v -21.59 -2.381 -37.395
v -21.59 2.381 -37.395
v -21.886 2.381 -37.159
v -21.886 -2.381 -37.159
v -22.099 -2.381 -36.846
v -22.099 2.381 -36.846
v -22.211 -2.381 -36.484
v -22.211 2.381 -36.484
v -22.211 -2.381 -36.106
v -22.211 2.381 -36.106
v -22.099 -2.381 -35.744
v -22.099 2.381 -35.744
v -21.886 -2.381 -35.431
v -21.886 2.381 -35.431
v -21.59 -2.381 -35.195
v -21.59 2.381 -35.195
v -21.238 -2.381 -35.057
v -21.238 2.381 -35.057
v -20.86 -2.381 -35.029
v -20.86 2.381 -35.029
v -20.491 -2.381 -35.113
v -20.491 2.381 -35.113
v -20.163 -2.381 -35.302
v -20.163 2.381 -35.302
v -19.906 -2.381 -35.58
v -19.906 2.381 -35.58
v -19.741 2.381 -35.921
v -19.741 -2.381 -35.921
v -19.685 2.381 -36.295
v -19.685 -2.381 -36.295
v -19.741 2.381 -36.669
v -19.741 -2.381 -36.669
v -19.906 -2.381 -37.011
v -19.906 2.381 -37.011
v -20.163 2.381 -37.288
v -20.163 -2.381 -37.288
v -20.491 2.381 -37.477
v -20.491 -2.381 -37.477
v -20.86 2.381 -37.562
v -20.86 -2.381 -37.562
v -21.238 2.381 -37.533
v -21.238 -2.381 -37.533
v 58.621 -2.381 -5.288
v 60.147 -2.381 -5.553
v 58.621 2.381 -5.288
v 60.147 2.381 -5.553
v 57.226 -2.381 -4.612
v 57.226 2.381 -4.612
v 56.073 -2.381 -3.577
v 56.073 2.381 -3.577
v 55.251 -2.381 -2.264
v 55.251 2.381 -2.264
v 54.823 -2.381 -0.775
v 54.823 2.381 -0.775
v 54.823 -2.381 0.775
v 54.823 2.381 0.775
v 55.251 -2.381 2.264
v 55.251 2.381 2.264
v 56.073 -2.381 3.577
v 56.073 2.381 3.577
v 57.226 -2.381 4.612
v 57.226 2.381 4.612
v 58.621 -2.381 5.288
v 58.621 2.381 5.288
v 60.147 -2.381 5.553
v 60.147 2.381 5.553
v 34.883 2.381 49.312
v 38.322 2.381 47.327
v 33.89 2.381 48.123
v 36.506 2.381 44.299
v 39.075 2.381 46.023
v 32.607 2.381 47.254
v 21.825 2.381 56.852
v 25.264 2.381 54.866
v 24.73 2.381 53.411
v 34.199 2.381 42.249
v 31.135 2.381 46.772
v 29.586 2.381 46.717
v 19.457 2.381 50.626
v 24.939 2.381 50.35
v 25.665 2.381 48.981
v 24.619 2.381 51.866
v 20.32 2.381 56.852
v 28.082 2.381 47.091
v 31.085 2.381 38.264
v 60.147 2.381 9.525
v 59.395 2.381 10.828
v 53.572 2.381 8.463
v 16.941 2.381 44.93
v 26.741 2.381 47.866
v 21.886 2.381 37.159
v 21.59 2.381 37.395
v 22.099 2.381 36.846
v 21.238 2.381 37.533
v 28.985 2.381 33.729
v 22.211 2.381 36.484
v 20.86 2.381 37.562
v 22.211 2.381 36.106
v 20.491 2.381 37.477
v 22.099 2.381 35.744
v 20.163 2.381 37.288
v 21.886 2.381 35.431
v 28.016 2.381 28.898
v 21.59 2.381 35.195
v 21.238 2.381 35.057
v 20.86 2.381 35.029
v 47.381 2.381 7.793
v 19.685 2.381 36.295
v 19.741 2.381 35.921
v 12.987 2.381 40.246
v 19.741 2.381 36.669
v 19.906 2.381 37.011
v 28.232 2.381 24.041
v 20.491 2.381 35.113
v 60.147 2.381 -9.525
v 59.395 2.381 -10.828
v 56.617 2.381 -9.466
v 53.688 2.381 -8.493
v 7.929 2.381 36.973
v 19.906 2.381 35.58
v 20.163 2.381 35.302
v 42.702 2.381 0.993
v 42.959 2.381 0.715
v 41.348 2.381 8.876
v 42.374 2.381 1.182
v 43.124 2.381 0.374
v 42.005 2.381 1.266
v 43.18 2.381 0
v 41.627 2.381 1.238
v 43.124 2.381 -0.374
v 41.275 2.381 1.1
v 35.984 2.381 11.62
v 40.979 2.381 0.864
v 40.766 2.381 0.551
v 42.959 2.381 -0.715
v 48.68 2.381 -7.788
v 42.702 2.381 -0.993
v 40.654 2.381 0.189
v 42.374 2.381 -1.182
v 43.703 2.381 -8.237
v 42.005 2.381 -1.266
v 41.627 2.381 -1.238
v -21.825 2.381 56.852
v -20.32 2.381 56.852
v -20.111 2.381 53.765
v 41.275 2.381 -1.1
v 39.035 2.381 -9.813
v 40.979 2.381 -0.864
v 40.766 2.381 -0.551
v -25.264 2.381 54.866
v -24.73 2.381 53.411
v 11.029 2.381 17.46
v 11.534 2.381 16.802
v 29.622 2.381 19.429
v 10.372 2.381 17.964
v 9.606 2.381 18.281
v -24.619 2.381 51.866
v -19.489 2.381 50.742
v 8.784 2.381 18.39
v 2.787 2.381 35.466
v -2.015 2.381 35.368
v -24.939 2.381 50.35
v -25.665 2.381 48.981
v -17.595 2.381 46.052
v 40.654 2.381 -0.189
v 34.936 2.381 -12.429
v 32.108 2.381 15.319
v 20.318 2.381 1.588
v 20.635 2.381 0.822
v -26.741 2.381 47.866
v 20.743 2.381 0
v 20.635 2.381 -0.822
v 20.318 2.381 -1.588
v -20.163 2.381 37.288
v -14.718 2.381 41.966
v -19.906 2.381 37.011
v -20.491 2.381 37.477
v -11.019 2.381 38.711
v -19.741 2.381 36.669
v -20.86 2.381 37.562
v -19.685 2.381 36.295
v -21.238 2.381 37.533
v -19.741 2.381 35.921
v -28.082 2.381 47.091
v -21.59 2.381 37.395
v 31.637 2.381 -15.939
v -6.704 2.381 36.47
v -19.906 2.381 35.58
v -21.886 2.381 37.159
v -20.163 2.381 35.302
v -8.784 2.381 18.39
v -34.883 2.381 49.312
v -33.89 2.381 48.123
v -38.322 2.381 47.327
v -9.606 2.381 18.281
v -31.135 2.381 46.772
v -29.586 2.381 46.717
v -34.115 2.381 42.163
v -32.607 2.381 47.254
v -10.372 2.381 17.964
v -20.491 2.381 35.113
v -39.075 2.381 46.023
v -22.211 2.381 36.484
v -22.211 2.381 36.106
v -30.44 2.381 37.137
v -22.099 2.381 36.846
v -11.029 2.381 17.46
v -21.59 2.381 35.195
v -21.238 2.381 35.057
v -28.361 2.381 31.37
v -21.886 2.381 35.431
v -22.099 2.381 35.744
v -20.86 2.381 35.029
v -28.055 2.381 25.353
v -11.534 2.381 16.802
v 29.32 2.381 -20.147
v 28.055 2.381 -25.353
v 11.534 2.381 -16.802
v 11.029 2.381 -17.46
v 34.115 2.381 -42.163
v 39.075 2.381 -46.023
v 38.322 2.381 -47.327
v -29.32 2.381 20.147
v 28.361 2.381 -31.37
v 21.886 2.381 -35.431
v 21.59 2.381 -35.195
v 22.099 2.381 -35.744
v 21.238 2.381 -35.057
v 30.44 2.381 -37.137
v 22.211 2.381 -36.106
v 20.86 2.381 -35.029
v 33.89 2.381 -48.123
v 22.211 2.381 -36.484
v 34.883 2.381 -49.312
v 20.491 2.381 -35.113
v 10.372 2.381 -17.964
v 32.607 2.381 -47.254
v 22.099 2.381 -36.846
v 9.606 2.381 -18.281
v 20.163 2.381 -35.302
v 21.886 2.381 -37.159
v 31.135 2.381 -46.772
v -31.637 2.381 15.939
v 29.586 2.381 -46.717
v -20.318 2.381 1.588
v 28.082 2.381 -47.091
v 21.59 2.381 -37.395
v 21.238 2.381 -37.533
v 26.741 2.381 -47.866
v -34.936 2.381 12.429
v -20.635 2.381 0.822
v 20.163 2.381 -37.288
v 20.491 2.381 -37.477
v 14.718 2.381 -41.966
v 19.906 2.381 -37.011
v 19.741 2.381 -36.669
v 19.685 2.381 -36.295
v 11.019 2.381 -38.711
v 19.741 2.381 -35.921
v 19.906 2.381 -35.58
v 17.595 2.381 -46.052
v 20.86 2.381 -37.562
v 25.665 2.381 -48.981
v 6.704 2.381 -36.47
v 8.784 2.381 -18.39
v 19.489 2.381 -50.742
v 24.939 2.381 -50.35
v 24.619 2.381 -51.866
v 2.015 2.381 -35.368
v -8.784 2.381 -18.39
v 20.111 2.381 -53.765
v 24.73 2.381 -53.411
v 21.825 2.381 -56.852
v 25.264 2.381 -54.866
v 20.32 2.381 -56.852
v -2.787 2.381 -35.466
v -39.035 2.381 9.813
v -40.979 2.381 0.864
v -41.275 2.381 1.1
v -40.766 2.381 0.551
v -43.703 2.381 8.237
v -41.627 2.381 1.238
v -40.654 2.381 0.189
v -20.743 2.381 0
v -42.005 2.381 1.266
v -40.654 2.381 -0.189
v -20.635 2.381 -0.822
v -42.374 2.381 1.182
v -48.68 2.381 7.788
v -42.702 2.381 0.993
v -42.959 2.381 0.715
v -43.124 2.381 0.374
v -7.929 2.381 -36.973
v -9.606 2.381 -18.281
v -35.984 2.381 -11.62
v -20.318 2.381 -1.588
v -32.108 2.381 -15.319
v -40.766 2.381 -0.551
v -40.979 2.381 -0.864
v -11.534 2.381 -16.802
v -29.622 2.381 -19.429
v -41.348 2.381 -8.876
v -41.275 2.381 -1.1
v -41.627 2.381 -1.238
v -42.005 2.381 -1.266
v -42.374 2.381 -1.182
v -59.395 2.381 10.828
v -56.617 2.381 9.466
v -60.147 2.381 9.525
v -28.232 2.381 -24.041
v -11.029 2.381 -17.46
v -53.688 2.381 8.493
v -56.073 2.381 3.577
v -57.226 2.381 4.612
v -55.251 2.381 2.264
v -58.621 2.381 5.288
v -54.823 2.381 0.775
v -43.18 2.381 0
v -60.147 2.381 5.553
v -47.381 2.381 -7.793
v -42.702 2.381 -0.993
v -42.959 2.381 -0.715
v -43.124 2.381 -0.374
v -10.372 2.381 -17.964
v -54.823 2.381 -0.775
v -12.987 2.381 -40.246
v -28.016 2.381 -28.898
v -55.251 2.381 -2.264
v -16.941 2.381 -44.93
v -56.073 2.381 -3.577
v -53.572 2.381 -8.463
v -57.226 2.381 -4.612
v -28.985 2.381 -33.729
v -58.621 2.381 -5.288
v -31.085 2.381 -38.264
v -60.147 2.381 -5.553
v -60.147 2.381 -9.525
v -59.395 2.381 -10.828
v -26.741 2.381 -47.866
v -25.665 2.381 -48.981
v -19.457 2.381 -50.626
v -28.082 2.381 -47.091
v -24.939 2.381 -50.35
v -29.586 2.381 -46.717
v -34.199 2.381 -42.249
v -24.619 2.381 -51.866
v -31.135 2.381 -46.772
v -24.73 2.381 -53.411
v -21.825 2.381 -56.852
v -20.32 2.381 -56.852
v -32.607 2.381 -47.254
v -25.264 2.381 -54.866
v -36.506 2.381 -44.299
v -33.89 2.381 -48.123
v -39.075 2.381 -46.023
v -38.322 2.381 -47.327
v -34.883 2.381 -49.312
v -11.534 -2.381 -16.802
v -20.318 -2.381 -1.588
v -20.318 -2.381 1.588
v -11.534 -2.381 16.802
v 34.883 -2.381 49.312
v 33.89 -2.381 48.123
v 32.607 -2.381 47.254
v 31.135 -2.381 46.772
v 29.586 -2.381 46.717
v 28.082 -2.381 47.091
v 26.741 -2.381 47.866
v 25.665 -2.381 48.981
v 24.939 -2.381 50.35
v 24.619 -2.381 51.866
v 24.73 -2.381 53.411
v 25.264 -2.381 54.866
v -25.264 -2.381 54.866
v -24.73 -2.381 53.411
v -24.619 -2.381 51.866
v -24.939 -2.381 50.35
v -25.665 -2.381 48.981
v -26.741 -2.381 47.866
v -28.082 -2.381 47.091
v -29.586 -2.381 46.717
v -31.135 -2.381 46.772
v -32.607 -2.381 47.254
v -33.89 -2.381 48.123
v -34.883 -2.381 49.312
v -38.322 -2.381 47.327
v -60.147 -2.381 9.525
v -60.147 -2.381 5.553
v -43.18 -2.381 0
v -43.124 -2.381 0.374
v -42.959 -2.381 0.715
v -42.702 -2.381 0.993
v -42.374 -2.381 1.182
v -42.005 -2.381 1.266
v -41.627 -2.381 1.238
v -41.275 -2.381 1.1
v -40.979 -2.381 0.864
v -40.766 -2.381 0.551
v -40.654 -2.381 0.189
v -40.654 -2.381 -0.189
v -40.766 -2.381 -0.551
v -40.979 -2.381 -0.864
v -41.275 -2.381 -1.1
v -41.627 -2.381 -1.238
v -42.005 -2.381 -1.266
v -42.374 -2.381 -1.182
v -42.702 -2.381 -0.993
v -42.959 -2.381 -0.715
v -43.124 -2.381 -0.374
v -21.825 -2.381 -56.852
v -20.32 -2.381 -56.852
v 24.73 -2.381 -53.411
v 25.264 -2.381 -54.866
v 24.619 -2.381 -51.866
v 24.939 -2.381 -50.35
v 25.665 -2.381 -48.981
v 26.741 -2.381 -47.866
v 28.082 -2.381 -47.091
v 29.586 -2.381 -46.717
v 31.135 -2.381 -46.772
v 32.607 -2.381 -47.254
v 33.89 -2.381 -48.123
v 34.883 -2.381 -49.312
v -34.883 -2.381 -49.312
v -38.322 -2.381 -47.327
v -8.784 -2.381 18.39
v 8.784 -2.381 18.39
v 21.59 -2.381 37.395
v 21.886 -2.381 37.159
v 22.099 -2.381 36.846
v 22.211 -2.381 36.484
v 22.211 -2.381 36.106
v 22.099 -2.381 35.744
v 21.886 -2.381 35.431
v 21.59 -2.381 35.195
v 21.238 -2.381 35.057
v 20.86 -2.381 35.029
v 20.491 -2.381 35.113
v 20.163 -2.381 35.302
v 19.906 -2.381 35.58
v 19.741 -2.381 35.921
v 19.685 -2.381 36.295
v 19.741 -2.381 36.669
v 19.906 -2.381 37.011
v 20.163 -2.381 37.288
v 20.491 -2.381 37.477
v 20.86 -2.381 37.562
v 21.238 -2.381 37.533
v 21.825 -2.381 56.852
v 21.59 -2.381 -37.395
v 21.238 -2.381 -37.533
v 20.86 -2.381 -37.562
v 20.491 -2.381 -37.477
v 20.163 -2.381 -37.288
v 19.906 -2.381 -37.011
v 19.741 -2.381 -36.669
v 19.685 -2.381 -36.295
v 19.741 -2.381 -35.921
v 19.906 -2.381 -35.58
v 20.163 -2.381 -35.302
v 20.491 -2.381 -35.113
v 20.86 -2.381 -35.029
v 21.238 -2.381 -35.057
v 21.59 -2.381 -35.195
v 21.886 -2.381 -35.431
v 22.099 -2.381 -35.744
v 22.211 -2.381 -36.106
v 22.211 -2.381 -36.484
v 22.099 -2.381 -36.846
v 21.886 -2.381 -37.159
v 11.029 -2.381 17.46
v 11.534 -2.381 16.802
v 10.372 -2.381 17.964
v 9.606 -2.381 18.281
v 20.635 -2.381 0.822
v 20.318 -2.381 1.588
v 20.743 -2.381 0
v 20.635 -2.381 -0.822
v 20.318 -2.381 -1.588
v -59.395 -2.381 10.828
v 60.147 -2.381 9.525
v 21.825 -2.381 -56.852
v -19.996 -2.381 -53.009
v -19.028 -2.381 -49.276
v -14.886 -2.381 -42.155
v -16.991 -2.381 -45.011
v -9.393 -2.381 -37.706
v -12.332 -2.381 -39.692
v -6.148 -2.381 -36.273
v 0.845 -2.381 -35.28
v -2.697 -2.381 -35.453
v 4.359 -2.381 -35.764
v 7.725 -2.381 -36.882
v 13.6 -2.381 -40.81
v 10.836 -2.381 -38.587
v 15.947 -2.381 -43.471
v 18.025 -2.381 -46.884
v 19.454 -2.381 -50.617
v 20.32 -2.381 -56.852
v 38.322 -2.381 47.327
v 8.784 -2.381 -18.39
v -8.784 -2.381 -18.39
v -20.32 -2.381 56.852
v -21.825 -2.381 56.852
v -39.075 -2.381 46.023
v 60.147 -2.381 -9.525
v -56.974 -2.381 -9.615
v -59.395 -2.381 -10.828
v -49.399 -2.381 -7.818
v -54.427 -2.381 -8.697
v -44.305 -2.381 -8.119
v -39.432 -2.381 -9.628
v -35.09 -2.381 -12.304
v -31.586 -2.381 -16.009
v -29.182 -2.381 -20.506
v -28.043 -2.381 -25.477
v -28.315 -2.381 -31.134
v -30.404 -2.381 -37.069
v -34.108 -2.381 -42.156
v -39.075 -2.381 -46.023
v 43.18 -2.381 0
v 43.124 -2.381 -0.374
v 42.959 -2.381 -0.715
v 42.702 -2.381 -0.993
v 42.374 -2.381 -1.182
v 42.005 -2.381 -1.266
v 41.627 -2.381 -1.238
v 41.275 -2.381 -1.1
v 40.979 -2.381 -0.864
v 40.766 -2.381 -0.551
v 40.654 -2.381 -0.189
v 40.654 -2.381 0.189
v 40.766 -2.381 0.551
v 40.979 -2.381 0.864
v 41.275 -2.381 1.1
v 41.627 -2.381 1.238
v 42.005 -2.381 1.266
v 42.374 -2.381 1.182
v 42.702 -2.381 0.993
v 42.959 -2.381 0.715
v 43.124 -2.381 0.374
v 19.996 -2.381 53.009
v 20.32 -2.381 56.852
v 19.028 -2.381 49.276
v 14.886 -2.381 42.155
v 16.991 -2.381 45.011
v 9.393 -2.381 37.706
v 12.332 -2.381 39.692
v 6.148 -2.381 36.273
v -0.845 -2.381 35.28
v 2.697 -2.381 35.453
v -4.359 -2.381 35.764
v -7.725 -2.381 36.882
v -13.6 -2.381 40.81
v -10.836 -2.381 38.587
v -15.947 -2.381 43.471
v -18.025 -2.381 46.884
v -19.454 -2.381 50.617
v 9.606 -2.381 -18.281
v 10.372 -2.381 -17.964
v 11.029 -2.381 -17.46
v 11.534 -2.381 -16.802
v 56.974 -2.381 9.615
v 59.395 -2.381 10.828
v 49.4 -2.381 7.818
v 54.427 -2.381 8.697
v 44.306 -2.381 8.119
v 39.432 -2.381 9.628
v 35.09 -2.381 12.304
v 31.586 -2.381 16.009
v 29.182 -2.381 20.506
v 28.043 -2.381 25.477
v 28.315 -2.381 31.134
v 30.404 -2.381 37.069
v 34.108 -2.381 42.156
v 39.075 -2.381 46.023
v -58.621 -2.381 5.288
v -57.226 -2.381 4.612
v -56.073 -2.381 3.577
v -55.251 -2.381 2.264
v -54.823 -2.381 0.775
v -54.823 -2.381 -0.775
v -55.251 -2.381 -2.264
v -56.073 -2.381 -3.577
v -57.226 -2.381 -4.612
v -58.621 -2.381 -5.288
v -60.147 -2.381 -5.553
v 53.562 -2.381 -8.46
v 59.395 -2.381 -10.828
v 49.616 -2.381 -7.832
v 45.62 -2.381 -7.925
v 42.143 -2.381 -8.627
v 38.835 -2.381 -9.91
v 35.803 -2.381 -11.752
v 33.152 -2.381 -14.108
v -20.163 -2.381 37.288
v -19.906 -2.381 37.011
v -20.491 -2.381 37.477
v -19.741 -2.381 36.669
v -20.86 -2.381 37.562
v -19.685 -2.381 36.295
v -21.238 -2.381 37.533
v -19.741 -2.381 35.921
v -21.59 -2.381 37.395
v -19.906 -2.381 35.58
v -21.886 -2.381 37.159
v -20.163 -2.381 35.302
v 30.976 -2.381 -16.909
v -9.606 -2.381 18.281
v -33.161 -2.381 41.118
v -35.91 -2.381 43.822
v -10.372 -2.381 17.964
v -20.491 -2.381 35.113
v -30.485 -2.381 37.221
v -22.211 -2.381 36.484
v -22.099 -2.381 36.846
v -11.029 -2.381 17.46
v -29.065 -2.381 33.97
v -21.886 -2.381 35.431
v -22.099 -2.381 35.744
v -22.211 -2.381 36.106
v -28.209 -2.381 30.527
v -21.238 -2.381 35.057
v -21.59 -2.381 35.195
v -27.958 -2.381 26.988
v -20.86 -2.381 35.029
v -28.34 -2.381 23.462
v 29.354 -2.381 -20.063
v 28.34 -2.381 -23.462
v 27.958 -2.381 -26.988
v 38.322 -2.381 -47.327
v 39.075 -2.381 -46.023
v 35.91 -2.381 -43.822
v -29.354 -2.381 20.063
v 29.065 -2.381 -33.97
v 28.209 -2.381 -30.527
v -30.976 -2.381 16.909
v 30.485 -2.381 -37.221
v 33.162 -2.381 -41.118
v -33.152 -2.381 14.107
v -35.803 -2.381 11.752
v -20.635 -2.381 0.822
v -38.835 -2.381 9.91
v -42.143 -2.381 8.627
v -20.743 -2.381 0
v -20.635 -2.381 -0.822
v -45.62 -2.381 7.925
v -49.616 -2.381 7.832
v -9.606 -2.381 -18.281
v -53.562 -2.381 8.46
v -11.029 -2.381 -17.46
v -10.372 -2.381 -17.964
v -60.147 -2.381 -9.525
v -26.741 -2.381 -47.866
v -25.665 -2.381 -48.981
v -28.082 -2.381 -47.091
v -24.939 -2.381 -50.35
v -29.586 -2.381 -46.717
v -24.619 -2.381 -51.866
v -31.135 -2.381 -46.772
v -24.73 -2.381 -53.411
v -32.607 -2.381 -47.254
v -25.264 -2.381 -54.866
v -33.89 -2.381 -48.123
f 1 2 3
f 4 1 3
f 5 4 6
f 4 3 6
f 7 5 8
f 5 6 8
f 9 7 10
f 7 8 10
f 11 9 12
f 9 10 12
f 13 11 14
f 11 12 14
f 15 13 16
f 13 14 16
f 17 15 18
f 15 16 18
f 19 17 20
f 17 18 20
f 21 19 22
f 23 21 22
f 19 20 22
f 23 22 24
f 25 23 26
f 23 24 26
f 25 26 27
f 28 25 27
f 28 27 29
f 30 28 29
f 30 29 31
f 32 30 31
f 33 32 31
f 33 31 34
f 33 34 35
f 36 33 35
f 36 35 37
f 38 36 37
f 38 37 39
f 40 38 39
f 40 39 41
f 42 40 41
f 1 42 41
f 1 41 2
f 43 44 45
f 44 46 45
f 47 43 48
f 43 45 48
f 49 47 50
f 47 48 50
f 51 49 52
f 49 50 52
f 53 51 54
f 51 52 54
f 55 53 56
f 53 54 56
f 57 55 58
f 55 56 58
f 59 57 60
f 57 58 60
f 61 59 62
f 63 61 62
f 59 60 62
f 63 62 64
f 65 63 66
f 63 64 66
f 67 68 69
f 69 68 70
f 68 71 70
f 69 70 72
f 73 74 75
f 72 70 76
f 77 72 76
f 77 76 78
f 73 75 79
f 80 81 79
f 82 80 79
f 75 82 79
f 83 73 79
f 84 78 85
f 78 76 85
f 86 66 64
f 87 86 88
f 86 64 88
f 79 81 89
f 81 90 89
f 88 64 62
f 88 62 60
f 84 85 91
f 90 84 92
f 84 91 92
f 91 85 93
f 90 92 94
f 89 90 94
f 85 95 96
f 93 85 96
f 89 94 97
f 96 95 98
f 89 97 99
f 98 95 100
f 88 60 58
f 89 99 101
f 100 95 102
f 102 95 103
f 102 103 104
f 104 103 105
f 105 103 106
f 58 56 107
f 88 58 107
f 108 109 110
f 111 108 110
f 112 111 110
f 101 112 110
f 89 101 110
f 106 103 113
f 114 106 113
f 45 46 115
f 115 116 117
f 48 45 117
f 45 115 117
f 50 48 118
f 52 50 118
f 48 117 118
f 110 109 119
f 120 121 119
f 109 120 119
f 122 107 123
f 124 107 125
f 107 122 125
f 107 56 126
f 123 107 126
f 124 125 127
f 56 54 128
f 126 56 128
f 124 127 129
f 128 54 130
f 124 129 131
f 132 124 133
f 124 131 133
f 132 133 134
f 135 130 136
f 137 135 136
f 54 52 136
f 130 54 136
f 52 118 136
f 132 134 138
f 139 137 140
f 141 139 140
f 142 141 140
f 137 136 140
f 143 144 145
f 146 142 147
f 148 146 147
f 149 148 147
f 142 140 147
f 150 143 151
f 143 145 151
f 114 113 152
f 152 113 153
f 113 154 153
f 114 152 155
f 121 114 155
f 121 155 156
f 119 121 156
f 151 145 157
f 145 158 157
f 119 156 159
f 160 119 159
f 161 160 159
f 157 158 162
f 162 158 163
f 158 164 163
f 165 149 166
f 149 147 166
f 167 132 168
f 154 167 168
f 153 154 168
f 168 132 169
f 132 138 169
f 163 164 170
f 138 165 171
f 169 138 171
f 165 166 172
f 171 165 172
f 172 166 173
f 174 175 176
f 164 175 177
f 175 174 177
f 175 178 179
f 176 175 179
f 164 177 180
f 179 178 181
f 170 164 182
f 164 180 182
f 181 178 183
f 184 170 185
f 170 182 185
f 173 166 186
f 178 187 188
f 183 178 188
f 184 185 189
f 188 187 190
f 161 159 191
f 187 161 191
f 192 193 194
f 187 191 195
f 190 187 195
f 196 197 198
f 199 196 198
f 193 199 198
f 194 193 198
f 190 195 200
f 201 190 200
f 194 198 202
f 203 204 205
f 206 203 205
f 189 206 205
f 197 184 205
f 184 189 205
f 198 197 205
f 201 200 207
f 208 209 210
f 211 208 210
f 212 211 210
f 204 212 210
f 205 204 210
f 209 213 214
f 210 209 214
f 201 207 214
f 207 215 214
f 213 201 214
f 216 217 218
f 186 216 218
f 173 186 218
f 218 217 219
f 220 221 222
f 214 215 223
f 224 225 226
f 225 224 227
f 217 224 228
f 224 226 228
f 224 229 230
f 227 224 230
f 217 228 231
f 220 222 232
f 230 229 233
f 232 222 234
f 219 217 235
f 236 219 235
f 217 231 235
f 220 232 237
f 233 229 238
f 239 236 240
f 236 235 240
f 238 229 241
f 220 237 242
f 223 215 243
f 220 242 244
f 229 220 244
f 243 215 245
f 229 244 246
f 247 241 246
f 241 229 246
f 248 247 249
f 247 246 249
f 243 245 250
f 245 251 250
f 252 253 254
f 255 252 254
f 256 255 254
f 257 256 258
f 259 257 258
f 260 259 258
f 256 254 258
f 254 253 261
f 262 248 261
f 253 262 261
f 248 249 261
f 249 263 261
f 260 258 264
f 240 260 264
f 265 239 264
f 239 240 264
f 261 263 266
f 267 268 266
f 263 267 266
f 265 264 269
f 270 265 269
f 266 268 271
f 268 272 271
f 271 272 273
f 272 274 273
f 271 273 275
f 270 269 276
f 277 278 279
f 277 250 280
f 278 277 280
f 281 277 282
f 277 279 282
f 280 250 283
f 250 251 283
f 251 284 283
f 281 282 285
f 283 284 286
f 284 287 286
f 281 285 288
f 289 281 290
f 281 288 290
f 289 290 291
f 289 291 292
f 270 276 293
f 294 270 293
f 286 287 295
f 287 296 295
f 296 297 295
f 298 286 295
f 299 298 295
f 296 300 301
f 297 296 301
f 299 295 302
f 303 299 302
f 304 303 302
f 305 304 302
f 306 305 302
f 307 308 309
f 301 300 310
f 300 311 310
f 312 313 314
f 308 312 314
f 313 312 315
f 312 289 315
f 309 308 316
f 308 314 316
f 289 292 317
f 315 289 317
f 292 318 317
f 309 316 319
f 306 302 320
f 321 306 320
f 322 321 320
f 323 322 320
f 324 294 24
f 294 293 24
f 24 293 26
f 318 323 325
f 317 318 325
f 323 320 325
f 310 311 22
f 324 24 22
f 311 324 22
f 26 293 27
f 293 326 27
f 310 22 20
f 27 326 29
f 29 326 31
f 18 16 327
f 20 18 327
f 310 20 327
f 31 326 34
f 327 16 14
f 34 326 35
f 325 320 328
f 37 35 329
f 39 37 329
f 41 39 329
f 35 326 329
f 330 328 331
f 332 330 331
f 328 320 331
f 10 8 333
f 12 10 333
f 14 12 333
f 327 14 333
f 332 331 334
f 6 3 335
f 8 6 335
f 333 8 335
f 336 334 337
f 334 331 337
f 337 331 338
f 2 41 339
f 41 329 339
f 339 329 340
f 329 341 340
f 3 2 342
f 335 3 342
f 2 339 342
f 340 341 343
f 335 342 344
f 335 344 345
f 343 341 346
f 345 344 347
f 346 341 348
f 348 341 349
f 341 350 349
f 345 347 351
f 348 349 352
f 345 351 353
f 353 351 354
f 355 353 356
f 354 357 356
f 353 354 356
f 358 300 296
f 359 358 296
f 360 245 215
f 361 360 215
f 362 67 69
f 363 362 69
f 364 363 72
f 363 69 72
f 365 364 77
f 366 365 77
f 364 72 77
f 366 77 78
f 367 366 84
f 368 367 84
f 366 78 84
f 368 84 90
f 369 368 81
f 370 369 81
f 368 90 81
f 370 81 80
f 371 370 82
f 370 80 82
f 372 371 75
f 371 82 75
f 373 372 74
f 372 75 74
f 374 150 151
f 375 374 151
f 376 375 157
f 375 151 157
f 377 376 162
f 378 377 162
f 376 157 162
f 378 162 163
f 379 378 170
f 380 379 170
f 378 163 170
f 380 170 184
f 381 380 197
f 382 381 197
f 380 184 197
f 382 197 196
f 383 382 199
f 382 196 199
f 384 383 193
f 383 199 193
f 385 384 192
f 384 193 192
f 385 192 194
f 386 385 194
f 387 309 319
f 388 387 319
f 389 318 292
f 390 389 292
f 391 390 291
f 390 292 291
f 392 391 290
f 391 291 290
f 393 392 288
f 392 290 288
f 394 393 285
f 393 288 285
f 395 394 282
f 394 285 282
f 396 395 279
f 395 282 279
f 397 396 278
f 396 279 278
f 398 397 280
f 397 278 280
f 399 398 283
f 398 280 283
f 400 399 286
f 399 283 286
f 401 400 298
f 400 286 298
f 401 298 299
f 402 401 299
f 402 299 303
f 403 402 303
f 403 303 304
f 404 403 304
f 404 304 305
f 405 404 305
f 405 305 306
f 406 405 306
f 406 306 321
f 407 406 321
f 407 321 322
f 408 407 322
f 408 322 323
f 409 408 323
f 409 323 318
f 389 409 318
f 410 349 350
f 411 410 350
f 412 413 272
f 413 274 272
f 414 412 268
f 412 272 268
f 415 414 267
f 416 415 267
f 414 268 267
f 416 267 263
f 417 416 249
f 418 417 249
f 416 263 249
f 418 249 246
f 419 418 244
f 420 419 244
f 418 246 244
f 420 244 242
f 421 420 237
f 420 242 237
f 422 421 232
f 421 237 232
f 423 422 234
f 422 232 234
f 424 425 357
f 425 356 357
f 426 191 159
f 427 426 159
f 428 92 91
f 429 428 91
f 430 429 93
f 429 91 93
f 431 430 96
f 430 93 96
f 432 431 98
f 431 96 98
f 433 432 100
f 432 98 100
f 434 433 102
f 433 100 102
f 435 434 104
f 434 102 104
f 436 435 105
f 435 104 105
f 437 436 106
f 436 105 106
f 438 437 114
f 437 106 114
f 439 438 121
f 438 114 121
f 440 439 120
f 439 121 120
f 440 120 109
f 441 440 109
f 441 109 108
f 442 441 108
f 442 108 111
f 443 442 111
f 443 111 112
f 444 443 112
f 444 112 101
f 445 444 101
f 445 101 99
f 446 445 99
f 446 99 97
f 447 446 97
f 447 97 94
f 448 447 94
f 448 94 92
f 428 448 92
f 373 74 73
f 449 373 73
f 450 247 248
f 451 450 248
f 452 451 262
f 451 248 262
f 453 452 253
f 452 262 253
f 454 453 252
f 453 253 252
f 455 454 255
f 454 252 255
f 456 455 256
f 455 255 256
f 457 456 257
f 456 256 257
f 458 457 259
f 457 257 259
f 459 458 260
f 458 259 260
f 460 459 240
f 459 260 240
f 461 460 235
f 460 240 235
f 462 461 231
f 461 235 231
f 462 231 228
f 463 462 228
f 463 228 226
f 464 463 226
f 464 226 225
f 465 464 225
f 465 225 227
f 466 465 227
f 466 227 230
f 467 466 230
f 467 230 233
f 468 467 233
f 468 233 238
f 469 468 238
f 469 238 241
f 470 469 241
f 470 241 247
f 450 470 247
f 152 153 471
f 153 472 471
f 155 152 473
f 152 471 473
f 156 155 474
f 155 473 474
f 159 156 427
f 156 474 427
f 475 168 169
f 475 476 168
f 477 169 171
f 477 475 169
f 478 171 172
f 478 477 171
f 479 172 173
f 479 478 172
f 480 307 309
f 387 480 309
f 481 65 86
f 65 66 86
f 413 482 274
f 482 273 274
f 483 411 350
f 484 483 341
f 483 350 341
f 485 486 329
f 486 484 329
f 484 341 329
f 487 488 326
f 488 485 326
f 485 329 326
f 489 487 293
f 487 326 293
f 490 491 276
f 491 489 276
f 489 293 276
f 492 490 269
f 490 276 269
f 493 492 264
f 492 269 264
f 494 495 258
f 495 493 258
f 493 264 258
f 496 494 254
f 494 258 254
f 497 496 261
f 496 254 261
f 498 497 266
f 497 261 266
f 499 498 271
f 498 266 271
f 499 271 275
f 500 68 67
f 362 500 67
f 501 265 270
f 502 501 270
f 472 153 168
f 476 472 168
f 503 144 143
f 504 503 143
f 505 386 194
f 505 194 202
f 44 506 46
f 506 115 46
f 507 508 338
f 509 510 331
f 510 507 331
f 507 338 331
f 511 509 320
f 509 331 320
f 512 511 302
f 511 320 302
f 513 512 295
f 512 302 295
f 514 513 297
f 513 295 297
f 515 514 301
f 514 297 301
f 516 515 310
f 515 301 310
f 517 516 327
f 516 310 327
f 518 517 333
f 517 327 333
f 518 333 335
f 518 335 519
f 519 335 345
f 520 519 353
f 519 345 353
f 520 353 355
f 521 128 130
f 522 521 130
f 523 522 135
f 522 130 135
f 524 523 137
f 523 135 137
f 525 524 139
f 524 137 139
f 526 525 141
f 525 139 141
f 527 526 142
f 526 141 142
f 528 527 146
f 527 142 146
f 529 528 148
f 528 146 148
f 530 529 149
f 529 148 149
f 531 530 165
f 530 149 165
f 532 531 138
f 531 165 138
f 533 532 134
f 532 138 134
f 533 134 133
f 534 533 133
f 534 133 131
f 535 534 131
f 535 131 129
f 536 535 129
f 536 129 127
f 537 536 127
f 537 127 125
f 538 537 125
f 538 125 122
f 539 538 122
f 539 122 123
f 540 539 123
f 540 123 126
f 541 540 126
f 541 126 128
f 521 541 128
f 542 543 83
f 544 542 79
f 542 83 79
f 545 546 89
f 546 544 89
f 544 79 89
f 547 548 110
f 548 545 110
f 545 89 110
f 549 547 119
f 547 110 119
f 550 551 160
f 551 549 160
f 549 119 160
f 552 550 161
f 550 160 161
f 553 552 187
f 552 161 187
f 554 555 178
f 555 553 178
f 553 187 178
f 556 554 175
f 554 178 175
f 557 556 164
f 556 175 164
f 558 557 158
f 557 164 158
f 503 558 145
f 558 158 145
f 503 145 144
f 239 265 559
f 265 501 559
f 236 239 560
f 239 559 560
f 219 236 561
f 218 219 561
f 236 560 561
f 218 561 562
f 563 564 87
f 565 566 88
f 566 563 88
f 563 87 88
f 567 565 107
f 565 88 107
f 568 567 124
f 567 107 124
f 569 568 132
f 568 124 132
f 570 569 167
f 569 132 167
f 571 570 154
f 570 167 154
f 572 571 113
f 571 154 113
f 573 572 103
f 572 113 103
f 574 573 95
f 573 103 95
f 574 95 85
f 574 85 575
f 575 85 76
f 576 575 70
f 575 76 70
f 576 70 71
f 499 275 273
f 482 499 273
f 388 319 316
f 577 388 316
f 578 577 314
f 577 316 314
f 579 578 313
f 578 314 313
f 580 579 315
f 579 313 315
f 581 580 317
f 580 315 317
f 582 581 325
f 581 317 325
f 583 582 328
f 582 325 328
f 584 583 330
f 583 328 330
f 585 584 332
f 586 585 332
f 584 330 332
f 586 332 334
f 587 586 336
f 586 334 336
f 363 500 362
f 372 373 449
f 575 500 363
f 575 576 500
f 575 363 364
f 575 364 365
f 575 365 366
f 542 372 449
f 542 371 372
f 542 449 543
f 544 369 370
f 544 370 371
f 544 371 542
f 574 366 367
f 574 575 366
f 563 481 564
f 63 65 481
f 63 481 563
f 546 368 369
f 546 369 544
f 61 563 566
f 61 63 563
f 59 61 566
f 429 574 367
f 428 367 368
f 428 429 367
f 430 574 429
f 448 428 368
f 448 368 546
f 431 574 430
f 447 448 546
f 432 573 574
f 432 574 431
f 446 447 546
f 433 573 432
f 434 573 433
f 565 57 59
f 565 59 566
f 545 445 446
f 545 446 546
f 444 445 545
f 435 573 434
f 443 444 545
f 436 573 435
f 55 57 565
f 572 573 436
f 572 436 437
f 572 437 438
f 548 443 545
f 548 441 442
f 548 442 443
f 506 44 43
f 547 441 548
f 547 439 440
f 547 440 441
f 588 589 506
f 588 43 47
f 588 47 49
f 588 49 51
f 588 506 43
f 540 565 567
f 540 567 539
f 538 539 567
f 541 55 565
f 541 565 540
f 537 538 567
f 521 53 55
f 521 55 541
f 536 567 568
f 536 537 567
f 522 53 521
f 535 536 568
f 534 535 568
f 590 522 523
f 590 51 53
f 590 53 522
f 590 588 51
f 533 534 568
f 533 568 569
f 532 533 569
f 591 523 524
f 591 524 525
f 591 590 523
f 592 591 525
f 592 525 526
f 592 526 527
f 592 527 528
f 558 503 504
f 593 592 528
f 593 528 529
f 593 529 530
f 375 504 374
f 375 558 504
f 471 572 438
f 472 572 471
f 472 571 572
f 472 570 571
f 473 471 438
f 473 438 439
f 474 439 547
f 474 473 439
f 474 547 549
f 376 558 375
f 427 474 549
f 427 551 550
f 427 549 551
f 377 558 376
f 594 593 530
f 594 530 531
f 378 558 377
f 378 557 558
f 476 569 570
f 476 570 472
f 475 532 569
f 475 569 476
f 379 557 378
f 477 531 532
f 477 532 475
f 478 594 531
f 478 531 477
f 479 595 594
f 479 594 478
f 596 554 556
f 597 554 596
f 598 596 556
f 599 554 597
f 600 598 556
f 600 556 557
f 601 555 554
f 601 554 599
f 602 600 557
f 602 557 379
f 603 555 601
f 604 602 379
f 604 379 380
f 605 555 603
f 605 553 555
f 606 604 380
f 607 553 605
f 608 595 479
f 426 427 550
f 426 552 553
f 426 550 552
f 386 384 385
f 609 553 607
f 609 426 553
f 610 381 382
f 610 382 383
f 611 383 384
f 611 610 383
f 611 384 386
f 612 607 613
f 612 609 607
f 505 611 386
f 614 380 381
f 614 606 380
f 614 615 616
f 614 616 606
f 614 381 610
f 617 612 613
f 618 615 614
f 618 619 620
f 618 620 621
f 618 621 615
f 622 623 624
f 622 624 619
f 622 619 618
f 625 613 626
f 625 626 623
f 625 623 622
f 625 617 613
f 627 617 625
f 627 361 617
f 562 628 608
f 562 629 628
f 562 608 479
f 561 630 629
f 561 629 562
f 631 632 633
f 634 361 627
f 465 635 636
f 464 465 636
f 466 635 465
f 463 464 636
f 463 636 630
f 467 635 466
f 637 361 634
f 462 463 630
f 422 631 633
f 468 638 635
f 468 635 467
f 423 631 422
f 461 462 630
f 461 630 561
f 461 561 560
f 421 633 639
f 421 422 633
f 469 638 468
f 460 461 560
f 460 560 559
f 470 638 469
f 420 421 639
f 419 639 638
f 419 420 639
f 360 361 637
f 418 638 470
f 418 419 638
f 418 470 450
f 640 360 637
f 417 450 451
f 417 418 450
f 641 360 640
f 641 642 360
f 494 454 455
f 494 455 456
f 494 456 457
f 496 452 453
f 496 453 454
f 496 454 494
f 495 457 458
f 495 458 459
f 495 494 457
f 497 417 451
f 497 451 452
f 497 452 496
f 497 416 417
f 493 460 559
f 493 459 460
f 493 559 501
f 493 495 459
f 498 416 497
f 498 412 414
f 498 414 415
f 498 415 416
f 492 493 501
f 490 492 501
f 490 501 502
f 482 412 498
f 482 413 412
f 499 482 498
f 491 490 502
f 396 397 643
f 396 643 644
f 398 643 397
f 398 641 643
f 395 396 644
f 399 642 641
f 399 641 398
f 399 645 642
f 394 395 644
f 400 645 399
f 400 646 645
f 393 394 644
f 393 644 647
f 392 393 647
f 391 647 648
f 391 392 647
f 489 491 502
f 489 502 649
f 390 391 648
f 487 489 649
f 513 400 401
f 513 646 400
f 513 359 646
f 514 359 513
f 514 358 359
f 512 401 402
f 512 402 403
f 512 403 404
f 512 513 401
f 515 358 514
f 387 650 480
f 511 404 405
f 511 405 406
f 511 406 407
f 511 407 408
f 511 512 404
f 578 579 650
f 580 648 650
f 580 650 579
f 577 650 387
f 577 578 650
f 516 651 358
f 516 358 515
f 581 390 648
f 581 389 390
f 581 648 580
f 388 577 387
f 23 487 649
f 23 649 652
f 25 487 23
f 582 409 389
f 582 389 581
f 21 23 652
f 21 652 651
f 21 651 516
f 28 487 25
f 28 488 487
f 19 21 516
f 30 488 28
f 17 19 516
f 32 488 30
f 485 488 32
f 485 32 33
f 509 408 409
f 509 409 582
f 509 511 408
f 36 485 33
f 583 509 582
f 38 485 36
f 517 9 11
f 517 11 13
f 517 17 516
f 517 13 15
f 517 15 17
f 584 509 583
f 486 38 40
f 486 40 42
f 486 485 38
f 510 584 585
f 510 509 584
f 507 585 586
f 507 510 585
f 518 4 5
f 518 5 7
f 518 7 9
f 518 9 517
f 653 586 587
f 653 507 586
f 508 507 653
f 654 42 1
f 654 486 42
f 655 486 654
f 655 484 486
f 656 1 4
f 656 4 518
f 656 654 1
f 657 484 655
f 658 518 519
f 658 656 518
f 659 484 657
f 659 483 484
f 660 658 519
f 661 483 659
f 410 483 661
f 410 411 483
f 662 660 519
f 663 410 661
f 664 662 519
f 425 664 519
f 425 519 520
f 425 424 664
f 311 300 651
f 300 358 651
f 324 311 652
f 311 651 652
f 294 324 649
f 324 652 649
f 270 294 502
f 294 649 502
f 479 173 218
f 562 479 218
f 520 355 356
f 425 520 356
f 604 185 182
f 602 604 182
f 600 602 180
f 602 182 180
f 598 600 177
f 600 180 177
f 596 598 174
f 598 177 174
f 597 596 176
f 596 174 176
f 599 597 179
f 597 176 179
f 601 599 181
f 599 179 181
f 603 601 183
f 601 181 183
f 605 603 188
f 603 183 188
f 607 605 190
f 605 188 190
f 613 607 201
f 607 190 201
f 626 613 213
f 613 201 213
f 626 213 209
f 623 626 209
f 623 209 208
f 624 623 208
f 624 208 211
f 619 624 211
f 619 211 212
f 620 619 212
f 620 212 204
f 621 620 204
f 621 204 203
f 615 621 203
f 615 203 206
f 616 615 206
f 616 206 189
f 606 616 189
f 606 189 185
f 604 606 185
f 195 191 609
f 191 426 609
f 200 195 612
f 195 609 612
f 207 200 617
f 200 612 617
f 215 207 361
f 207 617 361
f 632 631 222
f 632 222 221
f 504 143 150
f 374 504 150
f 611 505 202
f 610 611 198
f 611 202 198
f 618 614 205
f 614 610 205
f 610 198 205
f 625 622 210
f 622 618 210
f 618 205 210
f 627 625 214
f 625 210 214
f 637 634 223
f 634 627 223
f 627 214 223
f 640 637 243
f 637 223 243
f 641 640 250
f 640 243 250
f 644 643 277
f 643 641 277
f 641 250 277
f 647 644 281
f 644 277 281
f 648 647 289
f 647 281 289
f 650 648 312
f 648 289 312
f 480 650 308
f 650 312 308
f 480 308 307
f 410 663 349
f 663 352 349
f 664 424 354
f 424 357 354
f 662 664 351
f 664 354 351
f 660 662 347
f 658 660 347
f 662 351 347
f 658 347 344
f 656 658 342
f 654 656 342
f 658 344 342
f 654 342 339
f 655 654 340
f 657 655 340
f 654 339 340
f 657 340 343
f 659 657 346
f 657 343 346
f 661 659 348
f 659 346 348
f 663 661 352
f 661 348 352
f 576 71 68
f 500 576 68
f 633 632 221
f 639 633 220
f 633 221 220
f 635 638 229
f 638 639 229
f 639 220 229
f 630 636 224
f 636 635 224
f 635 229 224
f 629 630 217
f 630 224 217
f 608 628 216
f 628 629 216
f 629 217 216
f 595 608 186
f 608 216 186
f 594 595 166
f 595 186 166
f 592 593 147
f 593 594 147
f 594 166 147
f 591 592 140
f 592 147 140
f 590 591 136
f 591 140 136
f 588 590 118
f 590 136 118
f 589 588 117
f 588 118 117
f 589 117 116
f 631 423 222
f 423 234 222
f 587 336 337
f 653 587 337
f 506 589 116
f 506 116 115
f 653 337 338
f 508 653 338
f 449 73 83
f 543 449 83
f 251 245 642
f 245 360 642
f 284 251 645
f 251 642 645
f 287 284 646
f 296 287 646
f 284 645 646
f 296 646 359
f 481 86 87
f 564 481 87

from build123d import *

# Parameters (mm, degrees)
SKETCH1_R           = 12.7
BOSS_EXTRUDE1_DEPTH = 2.38125
CUT_EXTRUDE1_DEPTH  = 5.7625
FILLET1_R           = 3.175
SKETCH3_RX          = 21.59
SKETCH3_RY          = 20.32
CUT_EXTRUDE2_DEPTH  = 5.7625
CIRPATTERN1_COUNT   = 6
SKETCH4_R           = 1.27
CUT_EXTRUDE3_DEPTH  = 5.7625001
CIRPATTERN2_COUNT   = 6


with BuildPart() as part:
    # Sketch1 → Boss-Extrude1 (new body, symmetric)
    with BuildSketch(Plane(origin=(0, 0, 0), x_dir=(1, 0, 0), z_dir=(0, 1, 0))):
        with BuildLine():
            Line((-60.1472, 5.553404471), (-60.1472, 9.525))
            Line((-60.1472, 9.525), (-38.322491971, 47.326503167))
            Line((-38.322491971, 47.326503167), (-34.88298935, 49.312300931))
            ThreePointArc((-34.88298935, 49.312300931), (-27.384375, 47.431128834), (-25.26421065, 54.865705402))
            Line((-25.26421065, 54.865705402), (-21.824708029, 56.851503167))
            Line((-21.824708029, 56.851503167), (21.824708029, 56.851503167))
            Line((21.824708029, 56.851503167), (25.26421065, 54.865705402))
            ThreePointArc((25.26421065, 54.865705402), (27.384375, 47.431128834), (34.88298935, 49.312300931))
            Line((34.88298935, 49.312300931), (38.322491971, 47.326503167))
            Line((38.322491971, 47.326503167), (60.1472, 9.525))
            Line((60.1472, 9.525), (60.1472, 5.553404471))
            ThreePointArc((60.1472, 5.553404471), (54.76875, 0), (60.1472, -5.553404471))
            Line((60.1472, -5.553404471), (60.1472, -9.525))
            Line((60.1472, -9.525), (38.322491971, -47.326503167))
            Line((38.322491971, -47.326503167), (34.88298935, -49.312300931))
            ThreePointArc((34.88298935, -49.312300931), (27.384375, -47.431128834), (25.26421065, -54.865705402))
            Line((25.26421065, -54.865705402), (21.824708029, -56.851503167))
            Line((21.824708029, -56.851503167), (-21.824708029, -56.851503167))
            Line((-21.824708029, -56.851503167), (-25.26421065, -54.865705402))
            ThreePointArc((-25.26421065, -54.865705402), (-27.384375, -47.431128834), (-34.88298935, -49.312300931))
            Line((-34.88298935, -49.312300931), (-38.322491971, -47.326503167))
            Line((-38.322491971, -47.326503167), (-60.1472, -9.525))
            Line((-60.1472, -9.525), (-60.1472, -5.553404471))
            ThreePointArc((-60.1472, -5.553404471), (-54.76875, 0), (-60.1472, 5.553404471))
        make_face()
        Circle(SKETCH1_R, mode=Mode.SUBTRACT)
    extrude(amount=BOSS_EXTRUDE1_DEPTH, both=True)

    # Sketch2 → Cut-Extrude1 (cut, through all)
    with BuildSketch(Plane(origin=(0, 2.38125, 0), x_dir=(1, 0, 0), z_dir=(0, 1, 0))):
        Polygon((10.61724051, -18.3896), (21.234481021, 0), (10.61724051, 18.3896), (-10.61724051, 18.3896), (-21.234481021, 0), (-10.61724051, -18.3896), align=None)
    extrude(amount=-CUT_EXTRUDE1_DEPTH, mode=Mode.SUBTRACT)

    # Fillet1
    fillet1_edges = [part.edges().sort_by_distance(p)[0] for p in [
        (10.61724051, 0, 18.3896),
        (-10.61724051, 0, 18.3896),
        (-21.234481021, 0, 0),
        (-10.61724051, 0, -18.3896),
        (10.61724051, 0, -18.3896),
        (21.234481021, 0, 0),
    ]]
    fillet(fillet1_edges, radius=FILLET1_R)

    # Sketch3 → Cut-Extrude2 (cut, through all)
    with BuildSketch(Plane(origin=(0, 2.38125, 0), x_dir=(1, 0, 0), z_dir=(0, 1, 0))):
        with Locations(Location((0, -56.851503167), (0, 0, -90))):
            Ellipse(SKETCH3_RX, SKETCH3_RY)
    cut_extrude2 = extrude(amount=-CUT_EXTRUDE2_DEPTH, mode=Mode.SUBTRACT)

    # CirPattern1: Cut-Extrude2 ×6 about axis
    cirpattern1_axis = Axis((0, -2.619375, 0), (0, 1, 0))
    for i in range(1, CIRPATTERN1_COUNT):
        add(cut_extrude2.rotate(cirpattern1_axis, i * 360 / CIRPATTERN1_COUNT), mode=Mode.SUBTRACT)

    # Sketch4 → Cut-Extrude3 (cut, through all)
    with BuildSketch(Plane(origin=(0, 2.38125, 0), x_dir=(1, 0, 0), z_dir=(0, 1, 0))):
        with Locations((41.91, 0)):
            Circle(SKETCH4_R)
    cut_extrude3 = extrude(amount=-CUT_EXTRUDE3_DEPTH, mode=Mode.SUBTRACT)

    # CirPattern2: Cut-Extrude3 ×6 about axis
    cirpattern2_axis = Axis((0, 0, 0), (0, 1, 0))
    for i in range(1, CIRPATTERN2_COUNT):
        add(cut_extrude3.rotate(cirpattern2_axis, i * 360 / CIRPATTERN2_COUNT), mode=Mode.SUBTRACT)


solid = part.part
